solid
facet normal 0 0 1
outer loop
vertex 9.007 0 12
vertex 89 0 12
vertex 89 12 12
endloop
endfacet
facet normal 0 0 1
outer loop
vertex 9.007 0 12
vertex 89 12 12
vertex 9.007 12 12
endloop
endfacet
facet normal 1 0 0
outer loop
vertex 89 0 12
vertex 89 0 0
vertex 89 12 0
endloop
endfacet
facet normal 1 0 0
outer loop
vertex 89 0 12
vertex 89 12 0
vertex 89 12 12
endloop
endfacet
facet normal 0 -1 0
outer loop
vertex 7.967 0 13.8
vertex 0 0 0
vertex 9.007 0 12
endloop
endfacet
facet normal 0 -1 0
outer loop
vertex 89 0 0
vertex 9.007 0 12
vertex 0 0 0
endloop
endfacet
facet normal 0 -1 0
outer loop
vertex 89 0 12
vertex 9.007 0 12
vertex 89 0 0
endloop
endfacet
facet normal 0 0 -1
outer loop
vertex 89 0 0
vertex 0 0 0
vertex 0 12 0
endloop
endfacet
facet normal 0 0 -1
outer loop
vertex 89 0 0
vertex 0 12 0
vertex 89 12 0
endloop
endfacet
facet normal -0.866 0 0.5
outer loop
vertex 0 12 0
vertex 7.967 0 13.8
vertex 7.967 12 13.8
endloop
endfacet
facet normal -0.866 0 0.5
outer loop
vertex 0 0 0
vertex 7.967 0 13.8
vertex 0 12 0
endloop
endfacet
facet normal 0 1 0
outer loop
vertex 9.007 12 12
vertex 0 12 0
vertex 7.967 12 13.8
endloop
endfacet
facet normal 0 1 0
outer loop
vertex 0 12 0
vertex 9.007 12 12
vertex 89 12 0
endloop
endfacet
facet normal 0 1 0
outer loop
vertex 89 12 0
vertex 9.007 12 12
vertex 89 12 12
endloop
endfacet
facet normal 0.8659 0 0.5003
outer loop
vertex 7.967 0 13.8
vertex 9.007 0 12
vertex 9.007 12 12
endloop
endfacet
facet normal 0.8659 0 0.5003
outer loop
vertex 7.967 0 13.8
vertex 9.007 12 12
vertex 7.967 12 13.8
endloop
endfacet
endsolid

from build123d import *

# Parameters (mm, degrees)
F1_DEPTH = 12


# Not quite as in the source:
# - a feature names something its author has since deleted; it is built from what else it names


with BuildPart() as f1:
    # F0 (on Front) → F1 (new body)
    with BuildSketch(Plane.XZ):
        Polygon((7.9674337148, 13.8), (0, 0), (89, 0), (89, 12), (9.0066641994, 12), align=None)
    extrude(amount=-F1_DEPTH)


solid = f1.part
